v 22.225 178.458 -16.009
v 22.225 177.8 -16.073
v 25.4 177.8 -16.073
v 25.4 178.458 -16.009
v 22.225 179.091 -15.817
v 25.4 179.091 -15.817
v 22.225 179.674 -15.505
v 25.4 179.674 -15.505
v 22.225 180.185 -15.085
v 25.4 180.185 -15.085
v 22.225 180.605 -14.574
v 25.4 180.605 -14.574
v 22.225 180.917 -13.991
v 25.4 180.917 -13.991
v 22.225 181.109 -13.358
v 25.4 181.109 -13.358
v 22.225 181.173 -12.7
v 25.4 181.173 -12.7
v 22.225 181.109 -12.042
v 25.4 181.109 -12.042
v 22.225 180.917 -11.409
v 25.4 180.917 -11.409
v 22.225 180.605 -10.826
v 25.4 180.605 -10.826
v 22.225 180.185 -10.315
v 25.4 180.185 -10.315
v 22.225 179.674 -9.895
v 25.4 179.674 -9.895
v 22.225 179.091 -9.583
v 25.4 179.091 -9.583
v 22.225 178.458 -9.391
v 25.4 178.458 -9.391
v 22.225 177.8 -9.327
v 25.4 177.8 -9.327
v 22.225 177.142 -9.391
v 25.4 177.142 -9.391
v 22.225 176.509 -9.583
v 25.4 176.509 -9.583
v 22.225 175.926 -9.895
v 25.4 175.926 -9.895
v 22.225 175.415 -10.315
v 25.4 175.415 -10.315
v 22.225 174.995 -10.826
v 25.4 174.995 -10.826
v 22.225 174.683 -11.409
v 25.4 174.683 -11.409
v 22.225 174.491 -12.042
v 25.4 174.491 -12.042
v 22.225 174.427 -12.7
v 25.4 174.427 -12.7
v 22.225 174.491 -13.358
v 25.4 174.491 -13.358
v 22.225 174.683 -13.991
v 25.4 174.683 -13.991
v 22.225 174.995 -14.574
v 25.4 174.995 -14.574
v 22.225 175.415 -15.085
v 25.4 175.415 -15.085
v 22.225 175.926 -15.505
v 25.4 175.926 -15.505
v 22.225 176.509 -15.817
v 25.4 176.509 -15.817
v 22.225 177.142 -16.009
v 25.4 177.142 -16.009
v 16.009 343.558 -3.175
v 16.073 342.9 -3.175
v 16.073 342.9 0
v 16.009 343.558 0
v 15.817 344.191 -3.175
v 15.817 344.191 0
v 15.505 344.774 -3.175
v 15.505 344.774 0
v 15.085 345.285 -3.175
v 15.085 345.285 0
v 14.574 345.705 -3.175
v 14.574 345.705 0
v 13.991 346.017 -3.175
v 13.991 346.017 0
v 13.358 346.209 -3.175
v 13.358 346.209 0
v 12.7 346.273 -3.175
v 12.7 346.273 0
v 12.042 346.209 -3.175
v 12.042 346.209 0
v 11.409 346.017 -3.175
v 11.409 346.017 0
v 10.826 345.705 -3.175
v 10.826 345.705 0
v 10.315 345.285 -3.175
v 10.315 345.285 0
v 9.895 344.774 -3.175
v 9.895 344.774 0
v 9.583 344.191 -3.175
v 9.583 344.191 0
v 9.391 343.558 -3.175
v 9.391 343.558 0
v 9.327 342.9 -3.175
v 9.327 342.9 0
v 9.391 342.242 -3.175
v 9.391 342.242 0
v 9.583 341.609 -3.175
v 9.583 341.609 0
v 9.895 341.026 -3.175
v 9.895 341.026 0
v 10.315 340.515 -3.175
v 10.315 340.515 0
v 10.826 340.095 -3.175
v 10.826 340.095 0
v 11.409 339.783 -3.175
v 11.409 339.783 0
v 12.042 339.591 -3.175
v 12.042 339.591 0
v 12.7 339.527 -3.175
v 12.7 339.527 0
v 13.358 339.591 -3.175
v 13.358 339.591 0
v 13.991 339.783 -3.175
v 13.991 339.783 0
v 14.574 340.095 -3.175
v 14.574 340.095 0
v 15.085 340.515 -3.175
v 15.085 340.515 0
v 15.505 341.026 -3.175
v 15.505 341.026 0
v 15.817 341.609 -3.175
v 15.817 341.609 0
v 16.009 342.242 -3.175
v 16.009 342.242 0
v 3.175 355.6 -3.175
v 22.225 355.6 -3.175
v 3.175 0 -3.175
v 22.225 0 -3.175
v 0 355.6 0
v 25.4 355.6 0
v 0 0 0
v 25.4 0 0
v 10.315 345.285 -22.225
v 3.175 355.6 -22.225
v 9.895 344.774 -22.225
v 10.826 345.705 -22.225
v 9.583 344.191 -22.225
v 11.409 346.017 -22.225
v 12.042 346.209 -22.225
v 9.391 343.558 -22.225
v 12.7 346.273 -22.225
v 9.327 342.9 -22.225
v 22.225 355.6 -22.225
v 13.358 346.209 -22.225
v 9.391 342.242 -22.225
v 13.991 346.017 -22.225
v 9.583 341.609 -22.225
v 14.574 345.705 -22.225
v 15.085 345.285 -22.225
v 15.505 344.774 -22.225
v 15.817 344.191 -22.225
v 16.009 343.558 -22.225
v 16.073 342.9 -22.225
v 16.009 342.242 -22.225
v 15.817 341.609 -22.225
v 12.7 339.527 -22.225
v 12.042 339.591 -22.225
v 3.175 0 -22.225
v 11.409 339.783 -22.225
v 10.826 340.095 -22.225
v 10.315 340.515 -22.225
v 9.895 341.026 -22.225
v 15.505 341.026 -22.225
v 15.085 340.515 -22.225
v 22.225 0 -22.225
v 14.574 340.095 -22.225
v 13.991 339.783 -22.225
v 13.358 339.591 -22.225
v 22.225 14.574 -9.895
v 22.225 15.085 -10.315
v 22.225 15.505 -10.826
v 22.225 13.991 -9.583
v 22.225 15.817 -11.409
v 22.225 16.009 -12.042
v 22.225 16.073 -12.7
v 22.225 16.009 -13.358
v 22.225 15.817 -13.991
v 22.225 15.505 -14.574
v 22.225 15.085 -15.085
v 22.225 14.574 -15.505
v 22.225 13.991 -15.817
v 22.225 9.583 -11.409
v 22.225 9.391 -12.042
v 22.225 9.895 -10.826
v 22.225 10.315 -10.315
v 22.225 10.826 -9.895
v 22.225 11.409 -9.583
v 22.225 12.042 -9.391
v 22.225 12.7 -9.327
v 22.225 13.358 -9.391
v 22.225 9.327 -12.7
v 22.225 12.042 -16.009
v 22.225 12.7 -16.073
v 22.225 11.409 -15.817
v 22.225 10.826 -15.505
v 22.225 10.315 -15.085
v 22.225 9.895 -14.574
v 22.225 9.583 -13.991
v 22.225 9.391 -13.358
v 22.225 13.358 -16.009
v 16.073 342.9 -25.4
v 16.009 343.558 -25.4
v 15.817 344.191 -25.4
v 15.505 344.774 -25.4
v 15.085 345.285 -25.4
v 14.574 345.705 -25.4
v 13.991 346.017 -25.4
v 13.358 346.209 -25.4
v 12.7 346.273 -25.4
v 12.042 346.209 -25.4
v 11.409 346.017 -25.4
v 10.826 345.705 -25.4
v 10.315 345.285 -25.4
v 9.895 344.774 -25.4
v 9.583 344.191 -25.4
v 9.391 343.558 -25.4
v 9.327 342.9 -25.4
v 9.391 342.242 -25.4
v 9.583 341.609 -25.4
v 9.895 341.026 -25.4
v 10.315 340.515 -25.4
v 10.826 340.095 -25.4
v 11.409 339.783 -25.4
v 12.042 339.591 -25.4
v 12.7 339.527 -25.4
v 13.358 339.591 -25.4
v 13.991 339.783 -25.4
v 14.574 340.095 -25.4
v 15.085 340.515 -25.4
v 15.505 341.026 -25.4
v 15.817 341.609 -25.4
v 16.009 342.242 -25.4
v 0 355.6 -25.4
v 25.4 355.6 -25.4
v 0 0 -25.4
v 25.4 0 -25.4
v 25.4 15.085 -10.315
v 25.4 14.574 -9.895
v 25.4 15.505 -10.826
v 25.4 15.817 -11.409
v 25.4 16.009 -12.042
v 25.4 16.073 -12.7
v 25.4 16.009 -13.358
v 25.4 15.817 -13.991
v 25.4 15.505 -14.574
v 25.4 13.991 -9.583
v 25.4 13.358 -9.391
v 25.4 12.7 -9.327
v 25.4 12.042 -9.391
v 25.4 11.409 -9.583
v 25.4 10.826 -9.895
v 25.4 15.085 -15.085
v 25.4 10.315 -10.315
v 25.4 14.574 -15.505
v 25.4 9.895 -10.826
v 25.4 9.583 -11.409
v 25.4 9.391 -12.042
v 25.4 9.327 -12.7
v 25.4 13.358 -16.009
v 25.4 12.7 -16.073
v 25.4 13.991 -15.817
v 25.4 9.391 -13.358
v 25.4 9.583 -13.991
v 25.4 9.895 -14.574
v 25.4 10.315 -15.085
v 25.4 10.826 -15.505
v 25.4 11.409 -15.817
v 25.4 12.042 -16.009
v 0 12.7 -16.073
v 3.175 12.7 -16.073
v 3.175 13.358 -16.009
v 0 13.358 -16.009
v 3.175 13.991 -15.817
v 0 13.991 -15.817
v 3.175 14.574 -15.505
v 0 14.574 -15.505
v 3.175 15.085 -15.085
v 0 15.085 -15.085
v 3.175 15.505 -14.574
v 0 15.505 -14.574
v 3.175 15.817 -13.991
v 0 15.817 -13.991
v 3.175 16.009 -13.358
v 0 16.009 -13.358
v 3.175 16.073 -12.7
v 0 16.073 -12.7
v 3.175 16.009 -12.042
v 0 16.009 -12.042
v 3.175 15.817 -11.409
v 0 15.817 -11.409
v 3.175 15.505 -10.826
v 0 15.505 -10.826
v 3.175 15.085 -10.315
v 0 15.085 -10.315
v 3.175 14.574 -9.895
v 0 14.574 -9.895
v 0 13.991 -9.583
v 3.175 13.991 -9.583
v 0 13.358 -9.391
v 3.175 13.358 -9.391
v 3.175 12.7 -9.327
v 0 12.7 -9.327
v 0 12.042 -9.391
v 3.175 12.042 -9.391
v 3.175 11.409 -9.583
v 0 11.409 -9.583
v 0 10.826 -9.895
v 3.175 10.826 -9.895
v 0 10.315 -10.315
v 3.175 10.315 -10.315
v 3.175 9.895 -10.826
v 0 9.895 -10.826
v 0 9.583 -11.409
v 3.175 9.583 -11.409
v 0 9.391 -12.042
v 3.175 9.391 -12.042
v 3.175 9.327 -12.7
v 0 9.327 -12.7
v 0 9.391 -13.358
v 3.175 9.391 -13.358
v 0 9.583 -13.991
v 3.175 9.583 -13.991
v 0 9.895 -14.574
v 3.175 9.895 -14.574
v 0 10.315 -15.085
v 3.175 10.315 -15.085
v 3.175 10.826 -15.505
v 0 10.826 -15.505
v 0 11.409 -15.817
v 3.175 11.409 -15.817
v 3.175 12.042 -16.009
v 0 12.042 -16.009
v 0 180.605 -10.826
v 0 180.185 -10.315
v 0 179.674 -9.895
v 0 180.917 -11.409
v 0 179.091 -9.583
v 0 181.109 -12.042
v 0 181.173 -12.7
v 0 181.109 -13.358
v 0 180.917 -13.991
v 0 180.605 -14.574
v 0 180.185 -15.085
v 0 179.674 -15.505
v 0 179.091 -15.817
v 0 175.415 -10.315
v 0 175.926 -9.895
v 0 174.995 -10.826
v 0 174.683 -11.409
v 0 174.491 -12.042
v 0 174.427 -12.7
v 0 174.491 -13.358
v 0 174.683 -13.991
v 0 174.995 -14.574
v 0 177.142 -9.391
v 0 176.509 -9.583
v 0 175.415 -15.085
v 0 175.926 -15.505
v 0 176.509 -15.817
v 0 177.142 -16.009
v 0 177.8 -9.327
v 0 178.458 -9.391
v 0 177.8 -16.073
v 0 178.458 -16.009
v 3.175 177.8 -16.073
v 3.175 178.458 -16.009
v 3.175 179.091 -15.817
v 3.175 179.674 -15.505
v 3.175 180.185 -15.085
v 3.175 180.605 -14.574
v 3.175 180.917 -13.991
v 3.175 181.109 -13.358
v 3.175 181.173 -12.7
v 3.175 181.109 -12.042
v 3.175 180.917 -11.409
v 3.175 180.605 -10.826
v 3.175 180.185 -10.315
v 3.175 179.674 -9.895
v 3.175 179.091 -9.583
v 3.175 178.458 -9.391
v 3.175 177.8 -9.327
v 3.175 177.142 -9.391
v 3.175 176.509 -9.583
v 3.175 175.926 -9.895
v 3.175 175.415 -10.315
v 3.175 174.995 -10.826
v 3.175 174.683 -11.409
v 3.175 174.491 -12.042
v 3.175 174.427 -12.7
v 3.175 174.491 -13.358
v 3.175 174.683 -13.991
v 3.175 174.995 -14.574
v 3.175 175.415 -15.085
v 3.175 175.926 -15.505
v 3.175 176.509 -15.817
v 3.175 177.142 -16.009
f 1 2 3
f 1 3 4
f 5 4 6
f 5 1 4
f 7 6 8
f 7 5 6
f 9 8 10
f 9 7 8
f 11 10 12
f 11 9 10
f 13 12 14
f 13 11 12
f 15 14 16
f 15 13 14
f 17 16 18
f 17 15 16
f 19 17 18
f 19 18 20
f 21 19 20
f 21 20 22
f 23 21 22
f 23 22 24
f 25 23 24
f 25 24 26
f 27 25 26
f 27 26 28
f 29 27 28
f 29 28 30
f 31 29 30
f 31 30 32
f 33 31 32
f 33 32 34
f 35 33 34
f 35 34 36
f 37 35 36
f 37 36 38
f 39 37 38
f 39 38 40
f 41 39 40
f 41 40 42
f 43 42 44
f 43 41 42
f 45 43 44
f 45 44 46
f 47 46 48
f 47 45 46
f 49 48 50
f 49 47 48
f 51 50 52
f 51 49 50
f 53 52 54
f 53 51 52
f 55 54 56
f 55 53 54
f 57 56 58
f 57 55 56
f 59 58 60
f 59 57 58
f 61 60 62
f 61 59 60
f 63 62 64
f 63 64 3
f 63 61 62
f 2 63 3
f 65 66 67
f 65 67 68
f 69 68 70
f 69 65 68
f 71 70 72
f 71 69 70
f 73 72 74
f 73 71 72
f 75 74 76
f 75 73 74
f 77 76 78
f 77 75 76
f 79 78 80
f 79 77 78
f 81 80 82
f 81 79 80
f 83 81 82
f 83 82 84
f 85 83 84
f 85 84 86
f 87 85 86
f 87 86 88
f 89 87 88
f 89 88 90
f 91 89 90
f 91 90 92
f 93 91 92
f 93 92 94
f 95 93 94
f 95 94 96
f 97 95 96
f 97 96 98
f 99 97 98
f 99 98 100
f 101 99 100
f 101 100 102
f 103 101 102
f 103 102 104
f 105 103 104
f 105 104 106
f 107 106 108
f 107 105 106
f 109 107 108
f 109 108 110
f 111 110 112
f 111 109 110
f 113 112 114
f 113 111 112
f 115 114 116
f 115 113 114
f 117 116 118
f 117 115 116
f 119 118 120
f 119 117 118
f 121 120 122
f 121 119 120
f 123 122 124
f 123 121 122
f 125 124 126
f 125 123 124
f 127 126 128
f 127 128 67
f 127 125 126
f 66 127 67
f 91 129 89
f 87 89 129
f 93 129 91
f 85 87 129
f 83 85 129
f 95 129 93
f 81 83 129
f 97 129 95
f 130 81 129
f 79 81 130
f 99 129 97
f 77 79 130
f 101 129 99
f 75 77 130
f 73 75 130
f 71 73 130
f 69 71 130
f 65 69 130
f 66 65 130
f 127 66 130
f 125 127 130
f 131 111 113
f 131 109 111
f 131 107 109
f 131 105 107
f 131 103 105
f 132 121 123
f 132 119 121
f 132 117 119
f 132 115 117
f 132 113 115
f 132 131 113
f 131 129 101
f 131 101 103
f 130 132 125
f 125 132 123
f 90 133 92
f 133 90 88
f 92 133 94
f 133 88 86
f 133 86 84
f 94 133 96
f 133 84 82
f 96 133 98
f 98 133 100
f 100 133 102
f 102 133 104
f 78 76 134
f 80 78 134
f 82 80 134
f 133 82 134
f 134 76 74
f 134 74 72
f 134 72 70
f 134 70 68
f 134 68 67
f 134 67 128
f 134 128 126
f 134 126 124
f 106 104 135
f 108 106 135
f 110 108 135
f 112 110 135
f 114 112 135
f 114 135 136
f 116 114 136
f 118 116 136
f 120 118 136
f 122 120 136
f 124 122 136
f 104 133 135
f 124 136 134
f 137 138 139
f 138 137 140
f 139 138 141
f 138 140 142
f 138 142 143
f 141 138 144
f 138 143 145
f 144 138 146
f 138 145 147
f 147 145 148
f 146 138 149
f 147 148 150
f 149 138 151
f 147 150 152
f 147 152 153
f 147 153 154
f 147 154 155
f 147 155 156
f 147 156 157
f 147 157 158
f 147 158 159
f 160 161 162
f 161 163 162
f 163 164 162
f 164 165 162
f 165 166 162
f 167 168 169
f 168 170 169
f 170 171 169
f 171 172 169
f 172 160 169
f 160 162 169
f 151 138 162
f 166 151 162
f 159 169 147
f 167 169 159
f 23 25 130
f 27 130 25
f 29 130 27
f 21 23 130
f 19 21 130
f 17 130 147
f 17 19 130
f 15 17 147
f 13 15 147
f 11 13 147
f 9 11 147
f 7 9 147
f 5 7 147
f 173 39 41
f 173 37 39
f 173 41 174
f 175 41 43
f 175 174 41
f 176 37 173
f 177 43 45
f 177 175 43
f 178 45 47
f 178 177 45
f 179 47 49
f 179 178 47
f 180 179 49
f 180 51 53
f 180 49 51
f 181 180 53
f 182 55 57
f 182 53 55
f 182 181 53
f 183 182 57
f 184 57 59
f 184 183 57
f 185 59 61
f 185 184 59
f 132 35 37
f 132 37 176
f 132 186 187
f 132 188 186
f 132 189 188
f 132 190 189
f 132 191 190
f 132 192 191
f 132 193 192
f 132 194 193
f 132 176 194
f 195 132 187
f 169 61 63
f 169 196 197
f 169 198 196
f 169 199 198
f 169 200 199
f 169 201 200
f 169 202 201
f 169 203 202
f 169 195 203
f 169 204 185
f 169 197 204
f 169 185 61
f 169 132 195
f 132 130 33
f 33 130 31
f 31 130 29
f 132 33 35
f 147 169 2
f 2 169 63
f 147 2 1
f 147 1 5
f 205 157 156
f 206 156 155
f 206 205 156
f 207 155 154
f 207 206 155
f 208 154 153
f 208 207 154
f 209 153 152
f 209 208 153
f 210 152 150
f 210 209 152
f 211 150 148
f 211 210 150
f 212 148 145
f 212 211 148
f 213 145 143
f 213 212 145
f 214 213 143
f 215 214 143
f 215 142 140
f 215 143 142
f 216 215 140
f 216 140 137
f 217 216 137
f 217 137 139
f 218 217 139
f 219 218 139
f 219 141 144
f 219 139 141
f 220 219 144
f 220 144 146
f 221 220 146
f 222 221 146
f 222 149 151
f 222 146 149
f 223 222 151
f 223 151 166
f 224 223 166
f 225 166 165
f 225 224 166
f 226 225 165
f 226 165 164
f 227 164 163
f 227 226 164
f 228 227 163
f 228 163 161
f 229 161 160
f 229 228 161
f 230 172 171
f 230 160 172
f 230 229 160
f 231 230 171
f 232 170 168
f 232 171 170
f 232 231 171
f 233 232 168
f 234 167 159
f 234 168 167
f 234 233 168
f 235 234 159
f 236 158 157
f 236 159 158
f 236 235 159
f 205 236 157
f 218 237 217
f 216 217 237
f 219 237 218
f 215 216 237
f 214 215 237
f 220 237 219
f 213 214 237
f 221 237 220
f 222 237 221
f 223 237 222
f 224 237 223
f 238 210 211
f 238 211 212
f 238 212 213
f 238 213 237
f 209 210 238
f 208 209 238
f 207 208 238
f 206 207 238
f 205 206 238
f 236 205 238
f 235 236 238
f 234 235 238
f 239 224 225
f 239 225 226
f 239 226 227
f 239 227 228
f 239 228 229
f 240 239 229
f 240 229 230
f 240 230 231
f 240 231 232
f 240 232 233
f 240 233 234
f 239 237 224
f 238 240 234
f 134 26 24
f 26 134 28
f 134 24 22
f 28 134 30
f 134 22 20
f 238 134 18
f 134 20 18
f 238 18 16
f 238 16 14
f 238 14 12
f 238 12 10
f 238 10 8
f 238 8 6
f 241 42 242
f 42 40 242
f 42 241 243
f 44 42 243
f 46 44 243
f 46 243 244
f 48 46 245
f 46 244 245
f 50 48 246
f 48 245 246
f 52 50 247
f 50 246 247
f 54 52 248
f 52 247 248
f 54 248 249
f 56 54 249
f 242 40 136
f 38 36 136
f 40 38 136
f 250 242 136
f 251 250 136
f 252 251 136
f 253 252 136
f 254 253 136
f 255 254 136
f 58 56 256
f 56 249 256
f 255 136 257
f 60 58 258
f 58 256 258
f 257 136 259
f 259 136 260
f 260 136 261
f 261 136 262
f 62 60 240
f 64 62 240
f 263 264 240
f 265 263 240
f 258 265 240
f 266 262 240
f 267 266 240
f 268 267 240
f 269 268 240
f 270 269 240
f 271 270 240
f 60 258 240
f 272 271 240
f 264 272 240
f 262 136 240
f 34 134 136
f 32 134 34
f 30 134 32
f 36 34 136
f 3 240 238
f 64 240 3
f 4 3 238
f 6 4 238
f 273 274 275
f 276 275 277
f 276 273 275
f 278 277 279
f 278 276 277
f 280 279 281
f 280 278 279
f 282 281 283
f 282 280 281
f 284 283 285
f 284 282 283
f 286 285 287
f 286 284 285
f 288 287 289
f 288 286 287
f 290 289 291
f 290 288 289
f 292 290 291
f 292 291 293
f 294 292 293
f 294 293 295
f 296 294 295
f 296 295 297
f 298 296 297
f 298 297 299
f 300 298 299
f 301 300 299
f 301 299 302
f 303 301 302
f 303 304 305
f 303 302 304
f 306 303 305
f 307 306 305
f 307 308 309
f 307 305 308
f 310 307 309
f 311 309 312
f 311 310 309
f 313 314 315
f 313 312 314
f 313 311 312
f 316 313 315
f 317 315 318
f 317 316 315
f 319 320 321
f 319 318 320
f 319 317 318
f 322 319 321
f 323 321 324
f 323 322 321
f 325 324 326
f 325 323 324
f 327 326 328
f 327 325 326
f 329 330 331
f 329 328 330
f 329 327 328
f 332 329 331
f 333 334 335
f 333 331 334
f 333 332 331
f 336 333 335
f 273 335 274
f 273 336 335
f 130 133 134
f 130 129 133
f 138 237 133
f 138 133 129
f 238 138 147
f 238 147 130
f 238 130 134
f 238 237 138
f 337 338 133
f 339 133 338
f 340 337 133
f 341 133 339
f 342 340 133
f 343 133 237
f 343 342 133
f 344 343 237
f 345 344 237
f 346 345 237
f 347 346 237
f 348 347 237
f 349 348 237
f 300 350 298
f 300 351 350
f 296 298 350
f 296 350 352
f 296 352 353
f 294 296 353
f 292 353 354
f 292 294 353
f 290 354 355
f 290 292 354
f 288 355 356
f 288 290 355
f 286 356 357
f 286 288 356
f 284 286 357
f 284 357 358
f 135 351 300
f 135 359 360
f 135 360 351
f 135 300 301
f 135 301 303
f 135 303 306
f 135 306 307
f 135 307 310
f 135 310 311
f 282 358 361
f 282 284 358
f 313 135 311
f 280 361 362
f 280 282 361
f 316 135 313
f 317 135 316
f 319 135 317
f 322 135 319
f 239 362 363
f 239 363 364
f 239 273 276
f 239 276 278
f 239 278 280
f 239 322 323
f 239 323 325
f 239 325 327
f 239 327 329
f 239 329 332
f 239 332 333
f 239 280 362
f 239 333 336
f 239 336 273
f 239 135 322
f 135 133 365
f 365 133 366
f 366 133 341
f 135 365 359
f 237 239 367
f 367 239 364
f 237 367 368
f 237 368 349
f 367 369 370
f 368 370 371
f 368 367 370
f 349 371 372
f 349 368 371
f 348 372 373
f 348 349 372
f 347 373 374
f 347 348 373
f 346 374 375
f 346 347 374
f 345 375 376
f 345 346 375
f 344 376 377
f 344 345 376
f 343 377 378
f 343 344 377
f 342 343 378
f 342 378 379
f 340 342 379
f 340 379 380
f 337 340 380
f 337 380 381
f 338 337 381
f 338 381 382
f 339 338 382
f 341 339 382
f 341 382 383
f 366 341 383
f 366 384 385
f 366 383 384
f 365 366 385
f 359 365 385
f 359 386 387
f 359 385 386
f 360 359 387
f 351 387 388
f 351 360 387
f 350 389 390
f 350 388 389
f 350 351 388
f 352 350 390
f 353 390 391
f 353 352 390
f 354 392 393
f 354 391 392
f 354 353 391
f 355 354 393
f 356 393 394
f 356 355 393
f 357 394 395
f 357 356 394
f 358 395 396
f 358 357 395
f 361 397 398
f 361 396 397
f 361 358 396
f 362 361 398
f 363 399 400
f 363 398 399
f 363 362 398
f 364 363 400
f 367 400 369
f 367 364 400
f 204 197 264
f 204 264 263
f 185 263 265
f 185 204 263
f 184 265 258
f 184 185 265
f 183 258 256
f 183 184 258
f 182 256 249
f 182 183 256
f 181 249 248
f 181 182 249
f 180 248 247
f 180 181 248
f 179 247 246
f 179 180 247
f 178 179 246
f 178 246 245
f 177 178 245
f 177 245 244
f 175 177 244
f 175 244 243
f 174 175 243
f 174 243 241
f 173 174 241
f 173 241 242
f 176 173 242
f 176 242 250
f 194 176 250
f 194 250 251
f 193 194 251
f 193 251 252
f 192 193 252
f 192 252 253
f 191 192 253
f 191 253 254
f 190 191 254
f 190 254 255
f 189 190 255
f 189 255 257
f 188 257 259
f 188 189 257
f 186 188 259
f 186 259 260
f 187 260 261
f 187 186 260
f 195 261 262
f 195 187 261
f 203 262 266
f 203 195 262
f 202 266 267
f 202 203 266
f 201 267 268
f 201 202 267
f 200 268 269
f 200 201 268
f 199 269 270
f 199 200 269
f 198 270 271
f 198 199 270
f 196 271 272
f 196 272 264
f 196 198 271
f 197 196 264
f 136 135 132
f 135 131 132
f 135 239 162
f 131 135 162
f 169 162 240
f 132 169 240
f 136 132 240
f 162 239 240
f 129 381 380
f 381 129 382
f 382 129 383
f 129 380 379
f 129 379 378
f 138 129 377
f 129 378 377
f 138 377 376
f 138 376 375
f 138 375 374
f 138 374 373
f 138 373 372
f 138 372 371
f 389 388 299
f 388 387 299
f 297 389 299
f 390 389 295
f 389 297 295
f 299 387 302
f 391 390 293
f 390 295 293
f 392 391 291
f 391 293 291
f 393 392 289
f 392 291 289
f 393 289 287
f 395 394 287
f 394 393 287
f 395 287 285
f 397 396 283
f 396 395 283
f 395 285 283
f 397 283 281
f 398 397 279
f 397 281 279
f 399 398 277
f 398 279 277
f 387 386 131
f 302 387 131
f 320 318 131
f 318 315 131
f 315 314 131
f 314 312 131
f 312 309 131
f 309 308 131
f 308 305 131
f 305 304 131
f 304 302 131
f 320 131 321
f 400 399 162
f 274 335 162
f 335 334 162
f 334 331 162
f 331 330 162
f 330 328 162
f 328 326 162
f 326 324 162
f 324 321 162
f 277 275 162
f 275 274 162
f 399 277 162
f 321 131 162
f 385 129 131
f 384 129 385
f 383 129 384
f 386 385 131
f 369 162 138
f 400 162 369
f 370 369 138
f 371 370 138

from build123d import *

# Parameters (mm, degrees)
SKETCH1_W           = 25.4
SKETCH1_H           = 25.4
SKETCH1_W_2         = 19.05
SKETCH1_H_2         = 19.05
BOSS_EXTRUDE1_DEPTH = 355.6
CUT_EXTRUDE1_START  = -25.4
SKETCH2_R           = 3.3734375
CUT_EXTRUDE1_DEPTH  = 25.4
CUT_EXTRUDE2_START  = -25.4
SKETCH3_R           = 3.3734375
CUT_EXTRUDE2_DEPTH  = 25.4


with BuildPart() as part:
    # Sketch1 → Boss-Extrude1 (new body)
    with BuildSketch(Plane(origin=(0, 0, 0), x_dir=(1, 0, 0), z_dir=(0, 1, 0))):
        with Locations((12.7, 12.7)):
            Rectangle(SKETCH1_W, SKETCH1_H)
        with Locations((12.7, 12.7)):
            Rectangle(SKETCH1_W_2, SKETCH1_H_2, mode=Mode.SUBTRACT)
    extrude(amount=BOSS_EXTRUDE1_DEPTH)

    # Sketch2 → Cut-Extrude1 (cut)
    with BuildSketch(Plane(origin=(25.4, 0, 0), x_dir=(0, 0, -1), z_dir=(1, 0, 0)).offset(CUT_EXTRUDE1_START)):
        with Locations((12.7, 12.7)):
            Circle(SKETCH2_R)
        with Locations((12.7, 177.8)):
            Circle(SKETCH2_R)
    extrude(amount=CUT_EXTRUDE1_DEPTH, mode=Mode.SUBTRACT)

    # Sketch3 → Cut-Extrude2 (cut)
    with BuildSketch(Plane.XY.offset(CUT_EXTRUDE2_START)):
        with Locations((12.7, 342.9)):
            Circle(SKETCH3_R)
    extrude(amount=CUT_EXTRUDE2_DEPTH, mode=Mode.SUBTRACT)


solid = part.part
